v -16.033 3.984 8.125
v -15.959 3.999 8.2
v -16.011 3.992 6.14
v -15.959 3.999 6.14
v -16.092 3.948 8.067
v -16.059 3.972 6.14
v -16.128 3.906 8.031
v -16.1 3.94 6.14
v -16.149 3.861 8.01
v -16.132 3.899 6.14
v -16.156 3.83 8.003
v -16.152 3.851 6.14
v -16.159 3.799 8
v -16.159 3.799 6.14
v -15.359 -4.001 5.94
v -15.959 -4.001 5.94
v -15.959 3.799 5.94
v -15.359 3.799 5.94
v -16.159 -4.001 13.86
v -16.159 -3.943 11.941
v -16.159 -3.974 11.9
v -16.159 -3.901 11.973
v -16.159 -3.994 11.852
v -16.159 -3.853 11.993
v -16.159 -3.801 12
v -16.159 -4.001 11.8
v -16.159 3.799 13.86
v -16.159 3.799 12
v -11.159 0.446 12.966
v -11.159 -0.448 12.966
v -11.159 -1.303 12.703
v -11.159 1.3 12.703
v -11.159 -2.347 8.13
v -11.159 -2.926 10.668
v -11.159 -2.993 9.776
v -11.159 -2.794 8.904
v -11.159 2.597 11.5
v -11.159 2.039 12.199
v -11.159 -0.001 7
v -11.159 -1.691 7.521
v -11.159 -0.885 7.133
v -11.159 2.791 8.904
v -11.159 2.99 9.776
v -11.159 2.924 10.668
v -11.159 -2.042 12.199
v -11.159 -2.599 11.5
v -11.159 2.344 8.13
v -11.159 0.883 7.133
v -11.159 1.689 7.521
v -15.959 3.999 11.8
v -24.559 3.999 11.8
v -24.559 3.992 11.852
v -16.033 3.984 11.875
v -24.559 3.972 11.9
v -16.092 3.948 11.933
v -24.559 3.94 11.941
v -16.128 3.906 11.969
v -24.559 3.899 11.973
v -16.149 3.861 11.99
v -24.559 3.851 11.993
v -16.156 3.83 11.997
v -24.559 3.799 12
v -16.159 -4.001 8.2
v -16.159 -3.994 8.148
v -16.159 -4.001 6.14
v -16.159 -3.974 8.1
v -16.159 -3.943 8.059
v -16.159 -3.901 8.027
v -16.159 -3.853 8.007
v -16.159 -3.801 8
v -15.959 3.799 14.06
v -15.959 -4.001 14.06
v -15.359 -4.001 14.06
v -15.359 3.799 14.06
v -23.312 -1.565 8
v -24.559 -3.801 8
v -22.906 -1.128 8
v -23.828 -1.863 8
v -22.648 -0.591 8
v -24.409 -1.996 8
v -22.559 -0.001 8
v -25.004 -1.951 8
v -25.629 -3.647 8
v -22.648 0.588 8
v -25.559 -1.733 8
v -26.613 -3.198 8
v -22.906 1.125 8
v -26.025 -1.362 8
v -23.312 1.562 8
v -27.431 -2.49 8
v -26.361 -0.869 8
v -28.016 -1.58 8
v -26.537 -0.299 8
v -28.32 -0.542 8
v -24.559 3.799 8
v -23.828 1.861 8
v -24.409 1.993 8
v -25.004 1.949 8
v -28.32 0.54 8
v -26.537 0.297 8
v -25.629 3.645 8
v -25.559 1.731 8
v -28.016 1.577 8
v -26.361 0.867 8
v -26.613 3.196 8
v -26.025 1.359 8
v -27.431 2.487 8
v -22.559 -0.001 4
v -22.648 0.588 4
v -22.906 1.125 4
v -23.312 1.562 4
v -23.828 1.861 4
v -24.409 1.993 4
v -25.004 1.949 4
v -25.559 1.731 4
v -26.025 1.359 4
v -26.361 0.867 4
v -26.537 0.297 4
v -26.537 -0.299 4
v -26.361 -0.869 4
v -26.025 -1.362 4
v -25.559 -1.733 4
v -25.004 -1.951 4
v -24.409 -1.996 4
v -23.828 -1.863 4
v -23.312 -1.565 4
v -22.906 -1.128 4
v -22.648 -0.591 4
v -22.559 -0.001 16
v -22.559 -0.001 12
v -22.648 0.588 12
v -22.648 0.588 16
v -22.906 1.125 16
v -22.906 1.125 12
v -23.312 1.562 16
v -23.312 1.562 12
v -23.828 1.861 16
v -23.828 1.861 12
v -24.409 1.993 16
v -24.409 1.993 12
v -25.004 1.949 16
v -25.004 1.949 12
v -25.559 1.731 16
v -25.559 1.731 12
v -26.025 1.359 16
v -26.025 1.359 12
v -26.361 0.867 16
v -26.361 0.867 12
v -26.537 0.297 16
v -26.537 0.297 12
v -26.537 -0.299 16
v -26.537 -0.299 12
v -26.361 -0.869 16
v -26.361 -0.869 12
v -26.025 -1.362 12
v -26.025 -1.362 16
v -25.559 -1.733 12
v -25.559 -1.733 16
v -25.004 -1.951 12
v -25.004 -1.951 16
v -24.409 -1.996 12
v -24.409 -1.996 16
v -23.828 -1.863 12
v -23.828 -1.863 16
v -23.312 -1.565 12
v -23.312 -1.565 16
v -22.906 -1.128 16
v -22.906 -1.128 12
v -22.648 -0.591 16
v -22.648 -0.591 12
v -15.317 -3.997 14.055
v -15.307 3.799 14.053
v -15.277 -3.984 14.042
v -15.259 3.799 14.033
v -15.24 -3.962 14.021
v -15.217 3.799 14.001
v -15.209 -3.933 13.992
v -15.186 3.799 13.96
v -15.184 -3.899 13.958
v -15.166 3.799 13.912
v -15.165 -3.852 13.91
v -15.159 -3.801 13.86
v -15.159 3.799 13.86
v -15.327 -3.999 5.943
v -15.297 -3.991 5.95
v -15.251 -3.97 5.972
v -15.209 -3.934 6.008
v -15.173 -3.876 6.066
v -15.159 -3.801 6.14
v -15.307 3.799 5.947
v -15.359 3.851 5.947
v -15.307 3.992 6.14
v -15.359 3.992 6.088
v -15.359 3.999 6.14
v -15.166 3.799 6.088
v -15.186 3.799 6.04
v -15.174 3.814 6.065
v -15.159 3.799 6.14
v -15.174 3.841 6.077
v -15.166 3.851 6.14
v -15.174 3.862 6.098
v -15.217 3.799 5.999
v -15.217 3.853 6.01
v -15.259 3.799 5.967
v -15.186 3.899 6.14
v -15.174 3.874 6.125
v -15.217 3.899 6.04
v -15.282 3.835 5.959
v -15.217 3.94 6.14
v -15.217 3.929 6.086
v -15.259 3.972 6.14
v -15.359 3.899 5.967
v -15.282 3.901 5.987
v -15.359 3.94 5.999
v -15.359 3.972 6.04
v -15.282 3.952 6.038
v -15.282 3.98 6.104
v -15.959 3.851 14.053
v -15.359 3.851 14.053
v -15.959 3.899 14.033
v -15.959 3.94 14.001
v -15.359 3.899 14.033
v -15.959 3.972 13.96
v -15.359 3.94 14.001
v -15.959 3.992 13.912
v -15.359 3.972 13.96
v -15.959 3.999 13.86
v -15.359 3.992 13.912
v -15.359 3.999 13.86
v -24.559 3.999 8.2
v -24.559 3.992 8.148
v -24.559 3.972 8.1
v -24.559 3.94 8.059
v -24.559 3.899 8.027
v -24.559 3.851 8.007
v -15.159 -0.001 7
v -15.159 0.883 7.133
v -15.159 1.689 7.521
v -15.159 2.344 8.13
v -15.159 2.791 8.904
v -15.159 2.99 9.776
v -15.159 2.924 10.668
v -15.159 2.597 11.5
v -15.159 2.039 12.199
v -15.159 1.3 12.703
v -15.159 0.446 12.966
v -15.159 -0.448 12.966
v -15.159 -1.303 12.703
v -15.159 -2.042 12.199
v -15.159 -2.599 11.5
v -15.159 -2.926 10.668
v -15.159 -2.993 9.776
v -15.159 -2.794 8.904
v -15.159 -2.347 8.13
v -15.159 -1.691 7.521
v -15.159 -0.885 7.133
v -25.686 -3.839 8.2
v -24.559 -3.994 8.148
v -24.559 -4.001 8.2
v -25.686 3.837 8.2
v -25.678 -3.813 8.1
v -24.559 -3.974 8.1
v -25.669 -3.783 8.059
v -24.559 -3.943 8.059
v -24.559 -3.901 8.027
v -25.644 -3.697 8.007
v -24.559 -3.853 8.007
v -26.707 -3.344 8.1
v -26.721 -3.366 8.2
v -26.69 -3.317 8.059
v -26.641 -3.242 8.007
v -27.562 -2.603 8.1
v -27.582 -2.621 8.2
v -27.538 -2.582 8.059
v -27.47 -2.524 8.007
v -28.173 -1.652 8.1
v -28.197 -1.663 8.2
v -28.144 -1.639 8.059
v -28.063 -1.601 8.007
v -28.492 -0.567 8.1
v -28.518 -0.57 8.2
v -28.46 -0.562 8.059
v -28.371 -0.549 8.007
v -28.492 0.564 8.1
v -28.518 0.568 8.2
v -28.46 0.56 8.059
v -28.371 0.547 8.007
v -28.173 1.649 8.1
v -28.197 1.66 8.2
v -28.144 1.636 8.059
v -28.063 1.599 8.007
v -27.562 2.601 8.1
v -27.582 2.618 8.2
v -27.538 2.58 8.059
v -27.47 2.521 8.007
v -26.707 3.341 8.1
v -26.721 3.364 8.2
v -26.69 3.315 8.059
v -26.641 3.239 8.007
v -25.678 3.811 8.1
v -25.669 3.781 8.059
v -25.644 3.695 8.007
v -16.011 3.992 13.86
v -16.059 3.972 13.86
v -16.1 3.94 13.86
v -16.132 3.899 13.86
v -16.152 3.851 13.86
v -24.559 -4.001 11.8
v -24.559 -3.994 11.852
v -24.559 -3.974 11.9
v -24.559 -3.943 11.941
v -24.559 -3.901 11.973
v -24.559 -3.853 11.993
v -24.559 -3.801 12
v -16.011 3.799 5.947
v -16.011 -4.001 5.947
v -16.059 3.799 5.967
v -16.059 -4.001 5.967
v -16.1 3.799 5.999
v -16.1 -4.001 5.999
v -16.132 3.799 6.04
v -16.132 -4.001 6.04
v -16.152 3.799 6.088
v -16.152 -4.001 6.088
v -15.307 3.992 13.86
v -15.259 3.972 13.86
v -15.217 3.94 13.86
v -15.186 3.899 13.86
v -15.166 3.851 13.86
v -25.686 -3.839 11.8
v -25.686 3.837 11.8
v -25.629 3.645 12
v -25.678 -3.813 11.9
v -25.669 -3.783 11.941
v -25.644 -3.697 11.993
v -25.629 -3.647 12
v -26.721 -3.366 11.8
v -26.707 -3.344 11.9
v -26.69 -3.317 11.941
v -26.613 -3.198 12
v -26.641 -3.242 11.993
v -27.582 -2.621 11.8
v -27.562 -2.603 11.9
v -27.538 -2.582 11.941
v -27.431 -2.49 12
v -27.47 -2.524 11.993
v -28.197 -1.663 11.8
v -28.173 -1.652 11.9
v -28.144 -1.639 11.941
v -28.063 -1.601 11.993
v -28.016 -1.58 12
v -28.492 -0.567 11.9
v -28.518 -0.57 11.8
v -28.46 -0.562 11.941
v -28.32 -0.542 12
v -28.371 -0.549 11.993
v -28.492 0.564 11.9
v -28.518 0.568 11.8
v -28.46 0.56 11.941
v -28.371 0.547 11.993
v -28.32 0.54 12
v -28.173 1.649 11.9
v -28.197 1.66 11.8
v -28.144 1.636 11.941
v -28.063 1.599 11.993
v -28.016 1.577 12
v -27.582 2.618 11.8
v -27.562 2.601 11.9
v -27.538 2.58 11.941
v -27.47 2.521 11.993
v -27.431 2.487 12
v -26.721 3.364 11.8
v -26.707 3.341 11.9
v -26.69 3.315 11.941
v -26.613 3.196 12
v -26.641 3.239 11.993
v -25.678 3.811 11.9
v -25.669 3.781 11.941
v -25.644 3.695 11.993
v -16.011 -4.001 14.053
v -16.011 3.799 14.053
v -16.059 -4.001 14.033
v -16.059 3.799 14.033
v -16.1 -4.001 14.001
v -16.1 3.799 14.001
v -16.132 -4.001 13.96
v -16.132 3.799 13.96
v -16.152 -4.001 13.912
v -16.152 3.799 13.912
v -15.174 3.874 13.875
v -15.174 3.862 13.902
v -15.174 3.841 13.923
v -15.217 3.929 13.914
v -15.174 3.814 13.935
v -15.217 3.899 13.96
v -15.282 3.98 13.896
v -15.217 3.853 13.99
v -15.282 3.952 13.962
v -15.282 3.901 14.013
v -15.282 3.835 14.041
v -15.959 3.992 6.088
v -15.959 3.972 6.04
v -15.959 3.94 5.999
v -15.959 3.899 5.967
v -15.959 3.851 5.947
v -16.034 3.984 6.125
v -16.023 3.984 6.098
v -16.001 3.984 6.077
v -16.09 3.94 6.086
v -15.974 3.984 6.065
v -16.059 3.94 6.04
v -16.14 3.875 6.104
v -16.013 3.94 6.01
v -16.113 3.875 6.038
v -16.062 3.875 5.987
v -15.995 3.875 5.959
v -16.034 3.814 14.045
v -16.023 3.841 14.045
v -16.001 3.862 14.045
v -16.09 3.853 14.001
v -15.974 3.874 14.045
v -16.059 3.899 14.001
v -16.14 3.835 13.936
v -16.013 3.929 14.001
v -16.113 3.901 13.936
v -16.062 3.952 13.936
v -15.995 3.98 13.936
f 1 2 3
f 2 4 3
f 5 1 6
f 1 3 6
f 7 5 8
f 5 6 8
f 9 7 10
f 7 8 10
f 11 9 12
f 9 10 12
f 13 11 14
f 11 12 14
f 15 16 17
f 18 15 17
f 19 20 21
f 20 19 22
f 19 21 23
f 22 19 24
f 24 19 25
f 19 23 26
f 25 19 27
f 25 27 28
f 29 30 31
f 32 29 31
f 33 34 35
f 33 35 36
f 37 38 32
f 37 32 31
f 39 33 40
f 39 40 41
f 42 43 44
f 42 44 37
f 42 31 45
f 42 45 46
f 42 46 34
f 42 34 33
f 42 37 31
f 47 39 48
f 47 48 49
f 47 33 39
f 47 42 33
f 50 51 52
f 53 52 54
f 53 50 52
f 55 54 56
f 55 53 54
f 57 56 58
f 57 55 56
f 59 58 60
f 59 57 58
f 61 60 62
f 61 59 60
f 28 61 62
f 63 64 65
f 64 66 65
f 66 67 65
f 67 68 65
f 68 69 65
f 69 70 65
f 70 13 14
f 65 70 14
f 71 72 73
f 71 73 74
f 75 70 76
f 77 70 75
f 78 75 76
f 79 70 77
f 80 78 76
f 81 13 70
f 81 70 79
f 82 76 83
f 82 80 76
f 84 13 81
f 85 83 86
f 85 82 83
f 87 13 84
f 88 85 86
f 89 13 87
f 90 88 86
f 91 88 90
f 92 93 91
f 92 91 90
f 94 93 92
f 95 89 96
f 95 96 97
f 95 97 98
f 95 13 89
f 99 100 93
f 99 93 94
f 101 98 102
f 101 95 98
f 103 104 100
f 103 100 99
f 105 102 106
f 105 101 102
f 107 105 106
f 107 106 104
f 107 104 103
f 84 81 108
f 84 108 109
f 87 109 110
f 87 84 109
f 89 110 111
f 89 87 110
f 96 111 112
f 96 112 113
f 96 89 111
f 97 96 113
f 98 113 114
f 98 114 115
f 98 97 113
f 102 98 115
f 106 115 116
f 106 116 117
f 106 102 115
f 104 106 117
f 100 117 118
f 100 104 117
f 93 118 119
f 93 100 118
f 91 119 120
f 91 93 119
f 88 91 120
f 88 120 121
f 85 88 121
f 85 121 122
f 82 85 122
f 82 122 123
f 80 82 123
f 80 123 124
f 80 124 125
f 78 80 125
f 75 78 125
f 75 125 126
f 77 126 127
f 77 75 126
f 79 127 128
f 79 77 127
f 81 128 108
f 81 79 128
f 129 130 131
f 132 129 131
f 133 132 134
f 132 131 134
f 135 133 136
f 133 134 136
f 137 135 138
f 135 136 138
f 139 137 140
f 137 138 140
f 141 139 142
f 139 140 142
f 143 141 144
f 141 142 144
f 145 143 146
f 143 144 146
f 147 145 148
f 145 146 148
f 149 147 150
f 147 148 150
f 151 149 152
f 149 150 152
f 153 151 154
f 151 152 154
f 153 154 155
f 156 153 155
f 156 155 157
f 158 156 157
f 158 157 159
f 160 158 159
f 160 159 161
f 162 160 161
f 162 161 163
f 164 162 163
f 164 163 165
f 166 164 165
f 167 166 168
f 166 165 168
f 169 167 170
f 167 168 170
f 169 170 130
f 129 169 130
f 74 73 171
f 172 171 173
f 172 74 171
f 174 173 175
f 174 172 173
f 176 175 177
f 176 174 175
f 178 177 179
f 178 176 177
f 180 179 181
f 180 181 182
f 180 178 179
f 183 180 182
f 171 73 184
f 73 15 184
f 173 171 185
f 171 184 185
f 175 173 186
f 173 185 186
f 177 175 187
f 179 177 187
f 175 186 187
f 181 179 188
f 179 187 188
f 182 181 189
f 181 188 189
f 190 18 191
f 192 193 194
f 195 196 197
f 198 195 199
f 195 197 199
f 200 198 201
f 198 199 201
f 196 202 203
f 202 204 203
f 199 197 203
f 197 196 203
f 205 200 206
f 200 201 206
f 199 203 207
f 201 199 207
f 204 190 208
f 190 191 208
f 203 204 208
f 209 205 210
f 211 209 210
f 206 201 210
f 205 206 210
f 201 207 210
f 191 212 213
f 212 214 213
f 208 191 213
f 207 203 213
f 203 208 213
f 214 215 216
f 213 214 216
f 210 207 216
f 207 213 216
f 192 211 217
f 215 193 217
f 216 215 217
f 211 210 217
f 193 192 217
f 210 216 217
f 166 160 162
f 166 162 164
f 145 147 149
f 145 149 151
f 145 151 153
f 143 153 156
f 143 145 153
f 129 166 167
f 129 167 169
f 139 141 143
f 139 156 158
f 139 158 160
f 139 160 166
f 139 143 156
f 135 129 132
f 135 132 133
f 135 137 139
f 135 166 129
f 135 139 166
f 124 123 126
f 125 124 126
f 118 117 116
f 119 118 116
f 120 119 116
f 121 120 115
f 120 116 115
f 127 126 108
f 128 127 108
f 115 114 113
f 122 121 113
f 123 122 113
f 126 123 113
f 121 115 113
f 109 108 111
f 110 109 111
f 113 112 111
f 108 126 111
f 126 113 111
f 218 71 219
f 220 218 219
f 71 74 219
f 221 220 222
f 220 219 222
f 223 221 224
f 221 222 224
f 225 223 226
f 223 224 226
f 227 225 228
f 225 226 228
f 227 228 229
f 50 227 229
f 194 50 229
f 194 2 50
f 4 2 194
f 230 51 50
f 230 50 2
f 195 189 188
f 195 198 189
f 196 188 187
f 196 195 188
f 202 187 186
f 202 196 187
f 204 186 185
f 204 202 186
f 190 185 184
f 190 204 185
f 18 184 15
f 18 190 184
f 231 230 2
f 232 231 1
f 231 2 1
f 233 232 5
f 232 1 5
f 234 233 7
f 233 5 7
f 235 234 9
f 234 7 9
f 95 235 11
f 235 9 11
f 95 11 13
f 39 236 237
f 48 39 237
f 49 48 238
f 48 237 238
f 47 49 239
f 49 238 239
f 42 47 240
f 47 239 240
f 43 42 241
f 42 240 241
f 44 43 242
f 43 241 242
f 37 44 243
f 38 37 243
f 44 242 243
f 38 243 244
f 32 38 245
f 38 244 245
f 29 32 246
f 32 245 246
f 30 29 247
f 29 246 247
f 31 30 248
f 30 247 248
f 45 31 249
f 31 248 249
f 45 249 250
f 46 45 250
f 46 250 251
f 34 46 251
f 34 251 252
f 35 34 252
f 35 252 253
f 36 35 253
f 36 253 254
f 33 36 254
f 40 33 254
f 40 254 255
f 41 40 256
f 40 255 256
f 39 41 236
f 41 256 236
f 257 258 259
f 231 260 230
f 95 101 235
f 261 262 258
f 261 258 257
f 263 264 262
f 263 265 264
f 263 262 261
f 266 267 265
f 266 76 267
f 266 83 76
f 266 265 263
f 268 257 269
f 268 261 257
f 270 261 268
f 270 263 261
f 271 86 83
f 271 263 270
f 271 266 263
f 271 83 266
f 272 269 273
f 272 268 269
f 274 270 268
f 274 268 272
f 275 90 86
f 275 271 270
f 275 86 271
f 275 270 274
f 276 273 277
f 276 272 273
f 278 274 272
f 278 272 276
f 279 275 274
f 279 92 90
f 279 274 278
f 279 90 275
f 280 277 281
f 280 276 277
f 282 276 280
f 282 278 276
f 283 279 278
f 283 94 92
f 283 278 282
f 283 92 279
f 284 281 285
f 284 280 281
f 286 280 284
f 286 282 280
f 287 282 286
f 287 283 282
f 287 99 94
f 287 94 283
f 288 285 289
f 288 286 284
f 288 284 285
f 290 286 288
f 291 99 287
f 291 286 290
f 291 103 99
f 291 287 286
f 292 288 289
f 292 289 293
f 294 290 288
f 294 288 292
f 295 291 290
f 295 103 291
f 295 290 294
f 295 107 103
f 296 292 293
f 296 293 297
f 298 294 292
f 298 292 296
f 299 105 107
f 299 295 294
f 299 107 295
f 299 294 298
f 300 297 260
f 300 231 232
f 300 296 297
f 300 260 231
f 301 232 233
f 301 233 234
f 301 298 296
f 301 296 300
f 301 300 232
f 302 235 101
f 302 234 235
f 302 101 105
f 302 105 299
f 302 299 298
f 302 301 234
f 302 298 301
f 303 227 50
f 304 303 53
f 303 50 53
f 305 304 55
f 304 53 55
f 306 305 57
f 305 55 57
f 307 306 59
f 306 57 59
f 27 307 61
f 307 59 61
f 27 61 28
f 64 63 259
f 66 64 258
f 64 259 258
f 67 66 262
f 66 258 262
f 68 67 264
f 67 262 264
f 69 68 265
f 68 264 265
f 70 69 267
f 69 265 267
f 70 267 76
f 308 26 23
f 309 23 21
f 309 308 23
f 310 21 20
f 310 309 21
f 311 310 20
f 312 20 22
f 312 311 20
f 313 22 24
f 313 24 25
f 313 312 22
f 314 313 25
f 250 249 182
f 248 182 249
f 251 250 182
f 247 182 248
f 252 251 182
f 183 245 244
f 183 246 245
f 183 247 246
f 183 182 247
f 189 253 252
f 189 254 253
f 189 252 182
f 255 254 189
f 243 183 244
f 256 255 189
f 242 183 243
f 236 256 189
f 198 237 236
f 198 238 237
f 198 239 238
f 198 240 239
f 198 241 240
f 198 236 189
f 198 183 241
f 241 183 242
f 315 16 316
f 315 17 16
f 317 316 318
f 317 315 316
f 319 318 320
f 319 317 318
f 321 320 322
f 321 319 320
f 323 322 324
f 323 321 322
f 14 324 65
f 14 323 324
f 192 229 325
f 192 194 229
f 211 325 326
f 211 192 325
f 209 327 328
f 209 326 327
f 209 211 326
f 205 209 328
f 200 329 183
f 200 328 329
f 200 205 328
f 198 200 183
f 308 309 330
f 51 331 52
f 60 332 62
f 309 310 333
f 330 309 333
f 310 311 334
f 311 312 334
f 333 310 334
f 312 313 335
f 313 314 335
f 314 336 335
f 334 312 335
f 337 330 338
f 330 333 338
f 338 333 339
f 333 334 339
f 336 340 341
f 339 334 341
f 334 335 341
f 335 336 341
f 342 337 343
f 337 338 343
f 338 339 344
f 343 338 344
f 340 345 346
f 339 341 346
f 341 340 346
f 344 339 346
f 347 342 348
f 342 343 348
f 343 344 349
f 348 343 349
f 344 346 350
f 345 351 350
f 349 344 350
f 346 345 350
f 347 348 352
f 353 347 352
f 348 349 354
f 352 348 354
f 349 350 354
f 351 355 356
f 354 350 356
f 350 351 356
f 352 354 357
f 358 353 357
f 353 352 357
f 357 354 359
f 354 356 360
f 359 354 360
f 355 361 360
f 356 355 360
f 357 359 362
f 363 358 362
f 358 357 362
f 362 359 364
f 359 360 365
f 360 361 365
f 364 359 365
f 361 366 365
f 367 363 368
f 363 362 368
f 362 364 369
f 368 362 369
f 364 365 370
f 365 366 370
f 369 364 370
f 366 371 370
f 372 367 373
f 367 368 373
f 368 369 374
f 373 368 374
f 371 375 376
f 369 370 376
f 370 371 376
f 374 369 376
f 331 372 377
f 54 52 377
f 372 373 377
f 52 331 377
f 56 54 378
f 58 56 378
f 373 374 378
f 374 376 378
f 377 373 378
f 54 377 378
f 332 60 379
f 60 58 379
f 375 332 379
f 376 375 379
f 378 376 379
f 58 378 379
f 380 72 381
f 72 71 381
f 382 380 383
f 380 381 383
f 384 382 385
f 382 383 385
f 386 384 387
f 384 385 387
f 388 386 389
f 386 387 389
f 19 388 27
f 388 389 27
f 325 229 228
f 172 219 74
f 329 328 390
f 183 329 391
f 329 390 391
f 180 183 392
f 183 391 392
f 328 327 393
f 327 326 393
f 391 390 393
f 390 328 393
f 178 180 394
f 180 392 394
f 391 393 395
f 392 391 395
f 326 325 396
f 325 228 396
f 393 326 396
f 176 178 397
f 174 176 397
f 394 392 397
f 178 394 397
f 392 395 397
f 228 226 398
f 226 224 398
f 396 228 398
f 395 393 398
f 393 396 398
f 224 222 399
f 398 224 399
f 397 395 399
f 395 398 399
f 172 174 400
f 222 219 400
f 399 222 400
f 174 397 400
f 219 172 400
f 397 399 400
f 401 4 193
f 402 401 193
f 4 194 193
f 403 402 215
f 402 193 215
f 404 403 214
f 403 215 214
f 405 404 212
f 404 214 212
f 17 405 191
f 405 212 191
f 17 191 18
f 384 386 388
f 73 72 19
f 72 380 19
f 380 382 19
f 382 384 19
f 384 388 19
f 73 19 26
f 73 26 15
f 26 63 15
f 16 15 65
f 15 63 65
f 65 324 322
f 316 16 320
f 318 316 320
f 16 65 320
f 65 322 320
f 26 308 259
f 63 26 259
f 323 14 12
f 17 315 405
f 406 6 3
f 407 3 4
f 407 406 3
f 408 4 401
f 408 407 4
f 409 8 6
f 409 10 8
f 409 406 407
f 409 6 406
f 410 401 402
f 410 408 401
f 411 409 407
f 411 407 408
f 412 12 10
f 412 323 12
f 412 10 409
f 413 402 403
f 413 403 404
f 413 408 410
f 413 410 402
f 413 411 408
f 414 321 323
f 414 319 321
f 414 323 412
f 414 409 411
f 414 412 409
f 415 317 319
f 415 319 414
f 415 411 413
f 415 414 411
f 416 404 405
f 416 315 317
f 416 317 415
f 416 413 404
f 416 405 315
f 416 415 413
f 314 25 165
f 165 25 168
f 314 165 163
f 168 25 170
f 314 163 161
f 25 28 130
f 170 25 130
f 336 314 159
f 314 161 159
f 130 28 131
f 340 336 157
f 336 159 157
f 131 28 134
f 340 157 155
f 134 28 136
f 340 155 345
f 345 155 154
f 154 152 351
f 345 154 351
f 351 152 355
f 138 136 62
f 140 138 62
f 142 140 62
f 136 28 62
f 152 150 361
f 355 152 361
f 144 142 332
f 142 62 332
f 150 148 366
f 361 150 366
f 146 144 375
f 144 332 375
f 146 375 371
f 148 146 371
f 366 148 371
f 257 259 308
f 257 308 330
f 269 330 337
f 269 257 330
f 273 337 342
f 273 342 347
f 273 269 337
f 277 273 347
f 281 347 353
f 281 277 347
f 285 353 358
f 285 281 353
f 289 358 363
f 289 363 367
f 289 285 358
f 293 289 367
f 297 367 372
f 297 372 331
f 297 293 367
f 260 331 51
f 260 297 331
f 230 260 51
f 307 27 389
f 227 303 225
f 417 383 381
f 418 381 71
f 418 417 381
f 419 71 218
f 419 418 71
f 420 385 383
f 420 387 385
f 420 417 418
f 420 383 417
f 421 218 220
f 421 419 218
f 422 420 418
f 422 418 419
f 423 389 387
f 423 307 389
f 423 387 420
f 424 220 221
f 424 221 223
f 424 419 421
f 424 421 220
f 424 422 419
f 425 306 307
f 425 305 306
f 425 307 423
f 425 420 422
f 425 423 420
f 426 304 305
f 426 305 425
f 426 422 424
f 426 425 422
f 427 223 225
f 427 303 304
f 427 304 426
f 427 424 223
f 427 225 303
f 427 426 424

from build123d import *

# Parameters (mm, degrees)
BOSS_EXTRUDE1_DEPTH = 20
SKETCH2_R           = 10
BOSS_EXTRUDE2_DEPTH = 20
SKETCH3_W           = 40.597946668
SKETCH3_H           = 40
BOSS_EXTRUDE3_DEPTH = 5
SKETCH4_R           = 15
BOSS_EXTRUDE4_DEPTH = 20
FILLET1_R           = 1
L_EK2_SCALE         = 0.2


with BuildPart() as part:
    # Sketch1 → Boss-Extrude1 (new body)
    with BuildSketch(Plane.XY):
        with BuildLine():
            Line((-42, 20), (0, 20))
            Line((0, 20), (0, -20))
            Line((0, -20), (-42, -20))
            ThreePointArc((-42, -20), (-62, 0), (-42, 20))
        make_face()
    extrude(amount=BOSS_EXTRUDE1_DEPTH)

    # Sketch2 → Boss-Extrude2 (add)
    with BuildSketch(Plane.XY.offset(20)):
        with Locations((-42, 0)):
            Circle(SKETCH2_R)
    boss_extrude2 = extrude(amount=BOSS_EXTRUDE2_DEPTH)

    # Mirror1: Boss-Extrude2 across plane
    add(boss_extrude2.mirror(Plane.XY.offset(10)))

    # Sketch3 → Boss-Extrude3 (add)
    with BuildSketch(Plane(origin=(0, 0, 0), x_dir=(0, 0, -1), z_dir=(1, 0, 0))):
        with Locations((-10, 0)):
            Rectangle(SKETCH3_W, SKETCH3_H)
    extrude(amount=BOSS_EXTRUDE3_DEPTH)

    # Sketch4 → Boss-Extrude4 (add)
    with BuildSketch(Plane(origin=(5, 0, 0), x_dir=(0, 0, -1), z_dir=(1, 0, 0))):
        with Locations((-10, 0)):
            Circle(SKETCH4_R)
    extrude(amount=BOSS_EXTRUDE4_DEPTH)

    # Fillet1
    fillet1_edges = [part.edges().sort_by_distance(p)[0] for p in [
        (-21, 20, 20),
        (0, 0, -10.298973334),
        (0, 20, -5.149486667),
        (0, 20, 25.149486667),
        (2.5, 20, -10.298973334),
        (0, 0, 30.298973334),
        (2.5, 20, 30.298973334),
        (5, 0, -10.298973334),
        (5, 20, 10),
        (5, 0, 30.298973334),
        (5, -20, 10),
        (-62, 0, 20),
        (-21, 20, 0),
        (-21, -20, 0),
        (-62, 0, 0),
        (-21, -20, 20),
    ]]
    fillet(fillet1_edges, radius=FILLET1_R)


with BuildPart() as part_1:
    # Ölçek2: scaled about (-20.19862857, -0.001535567, 10)
    add(part.part.scale(L_EK2_SCALE).moved(Location((-16.158902856, -0.001228454, 8))))


solid = part_1.part
